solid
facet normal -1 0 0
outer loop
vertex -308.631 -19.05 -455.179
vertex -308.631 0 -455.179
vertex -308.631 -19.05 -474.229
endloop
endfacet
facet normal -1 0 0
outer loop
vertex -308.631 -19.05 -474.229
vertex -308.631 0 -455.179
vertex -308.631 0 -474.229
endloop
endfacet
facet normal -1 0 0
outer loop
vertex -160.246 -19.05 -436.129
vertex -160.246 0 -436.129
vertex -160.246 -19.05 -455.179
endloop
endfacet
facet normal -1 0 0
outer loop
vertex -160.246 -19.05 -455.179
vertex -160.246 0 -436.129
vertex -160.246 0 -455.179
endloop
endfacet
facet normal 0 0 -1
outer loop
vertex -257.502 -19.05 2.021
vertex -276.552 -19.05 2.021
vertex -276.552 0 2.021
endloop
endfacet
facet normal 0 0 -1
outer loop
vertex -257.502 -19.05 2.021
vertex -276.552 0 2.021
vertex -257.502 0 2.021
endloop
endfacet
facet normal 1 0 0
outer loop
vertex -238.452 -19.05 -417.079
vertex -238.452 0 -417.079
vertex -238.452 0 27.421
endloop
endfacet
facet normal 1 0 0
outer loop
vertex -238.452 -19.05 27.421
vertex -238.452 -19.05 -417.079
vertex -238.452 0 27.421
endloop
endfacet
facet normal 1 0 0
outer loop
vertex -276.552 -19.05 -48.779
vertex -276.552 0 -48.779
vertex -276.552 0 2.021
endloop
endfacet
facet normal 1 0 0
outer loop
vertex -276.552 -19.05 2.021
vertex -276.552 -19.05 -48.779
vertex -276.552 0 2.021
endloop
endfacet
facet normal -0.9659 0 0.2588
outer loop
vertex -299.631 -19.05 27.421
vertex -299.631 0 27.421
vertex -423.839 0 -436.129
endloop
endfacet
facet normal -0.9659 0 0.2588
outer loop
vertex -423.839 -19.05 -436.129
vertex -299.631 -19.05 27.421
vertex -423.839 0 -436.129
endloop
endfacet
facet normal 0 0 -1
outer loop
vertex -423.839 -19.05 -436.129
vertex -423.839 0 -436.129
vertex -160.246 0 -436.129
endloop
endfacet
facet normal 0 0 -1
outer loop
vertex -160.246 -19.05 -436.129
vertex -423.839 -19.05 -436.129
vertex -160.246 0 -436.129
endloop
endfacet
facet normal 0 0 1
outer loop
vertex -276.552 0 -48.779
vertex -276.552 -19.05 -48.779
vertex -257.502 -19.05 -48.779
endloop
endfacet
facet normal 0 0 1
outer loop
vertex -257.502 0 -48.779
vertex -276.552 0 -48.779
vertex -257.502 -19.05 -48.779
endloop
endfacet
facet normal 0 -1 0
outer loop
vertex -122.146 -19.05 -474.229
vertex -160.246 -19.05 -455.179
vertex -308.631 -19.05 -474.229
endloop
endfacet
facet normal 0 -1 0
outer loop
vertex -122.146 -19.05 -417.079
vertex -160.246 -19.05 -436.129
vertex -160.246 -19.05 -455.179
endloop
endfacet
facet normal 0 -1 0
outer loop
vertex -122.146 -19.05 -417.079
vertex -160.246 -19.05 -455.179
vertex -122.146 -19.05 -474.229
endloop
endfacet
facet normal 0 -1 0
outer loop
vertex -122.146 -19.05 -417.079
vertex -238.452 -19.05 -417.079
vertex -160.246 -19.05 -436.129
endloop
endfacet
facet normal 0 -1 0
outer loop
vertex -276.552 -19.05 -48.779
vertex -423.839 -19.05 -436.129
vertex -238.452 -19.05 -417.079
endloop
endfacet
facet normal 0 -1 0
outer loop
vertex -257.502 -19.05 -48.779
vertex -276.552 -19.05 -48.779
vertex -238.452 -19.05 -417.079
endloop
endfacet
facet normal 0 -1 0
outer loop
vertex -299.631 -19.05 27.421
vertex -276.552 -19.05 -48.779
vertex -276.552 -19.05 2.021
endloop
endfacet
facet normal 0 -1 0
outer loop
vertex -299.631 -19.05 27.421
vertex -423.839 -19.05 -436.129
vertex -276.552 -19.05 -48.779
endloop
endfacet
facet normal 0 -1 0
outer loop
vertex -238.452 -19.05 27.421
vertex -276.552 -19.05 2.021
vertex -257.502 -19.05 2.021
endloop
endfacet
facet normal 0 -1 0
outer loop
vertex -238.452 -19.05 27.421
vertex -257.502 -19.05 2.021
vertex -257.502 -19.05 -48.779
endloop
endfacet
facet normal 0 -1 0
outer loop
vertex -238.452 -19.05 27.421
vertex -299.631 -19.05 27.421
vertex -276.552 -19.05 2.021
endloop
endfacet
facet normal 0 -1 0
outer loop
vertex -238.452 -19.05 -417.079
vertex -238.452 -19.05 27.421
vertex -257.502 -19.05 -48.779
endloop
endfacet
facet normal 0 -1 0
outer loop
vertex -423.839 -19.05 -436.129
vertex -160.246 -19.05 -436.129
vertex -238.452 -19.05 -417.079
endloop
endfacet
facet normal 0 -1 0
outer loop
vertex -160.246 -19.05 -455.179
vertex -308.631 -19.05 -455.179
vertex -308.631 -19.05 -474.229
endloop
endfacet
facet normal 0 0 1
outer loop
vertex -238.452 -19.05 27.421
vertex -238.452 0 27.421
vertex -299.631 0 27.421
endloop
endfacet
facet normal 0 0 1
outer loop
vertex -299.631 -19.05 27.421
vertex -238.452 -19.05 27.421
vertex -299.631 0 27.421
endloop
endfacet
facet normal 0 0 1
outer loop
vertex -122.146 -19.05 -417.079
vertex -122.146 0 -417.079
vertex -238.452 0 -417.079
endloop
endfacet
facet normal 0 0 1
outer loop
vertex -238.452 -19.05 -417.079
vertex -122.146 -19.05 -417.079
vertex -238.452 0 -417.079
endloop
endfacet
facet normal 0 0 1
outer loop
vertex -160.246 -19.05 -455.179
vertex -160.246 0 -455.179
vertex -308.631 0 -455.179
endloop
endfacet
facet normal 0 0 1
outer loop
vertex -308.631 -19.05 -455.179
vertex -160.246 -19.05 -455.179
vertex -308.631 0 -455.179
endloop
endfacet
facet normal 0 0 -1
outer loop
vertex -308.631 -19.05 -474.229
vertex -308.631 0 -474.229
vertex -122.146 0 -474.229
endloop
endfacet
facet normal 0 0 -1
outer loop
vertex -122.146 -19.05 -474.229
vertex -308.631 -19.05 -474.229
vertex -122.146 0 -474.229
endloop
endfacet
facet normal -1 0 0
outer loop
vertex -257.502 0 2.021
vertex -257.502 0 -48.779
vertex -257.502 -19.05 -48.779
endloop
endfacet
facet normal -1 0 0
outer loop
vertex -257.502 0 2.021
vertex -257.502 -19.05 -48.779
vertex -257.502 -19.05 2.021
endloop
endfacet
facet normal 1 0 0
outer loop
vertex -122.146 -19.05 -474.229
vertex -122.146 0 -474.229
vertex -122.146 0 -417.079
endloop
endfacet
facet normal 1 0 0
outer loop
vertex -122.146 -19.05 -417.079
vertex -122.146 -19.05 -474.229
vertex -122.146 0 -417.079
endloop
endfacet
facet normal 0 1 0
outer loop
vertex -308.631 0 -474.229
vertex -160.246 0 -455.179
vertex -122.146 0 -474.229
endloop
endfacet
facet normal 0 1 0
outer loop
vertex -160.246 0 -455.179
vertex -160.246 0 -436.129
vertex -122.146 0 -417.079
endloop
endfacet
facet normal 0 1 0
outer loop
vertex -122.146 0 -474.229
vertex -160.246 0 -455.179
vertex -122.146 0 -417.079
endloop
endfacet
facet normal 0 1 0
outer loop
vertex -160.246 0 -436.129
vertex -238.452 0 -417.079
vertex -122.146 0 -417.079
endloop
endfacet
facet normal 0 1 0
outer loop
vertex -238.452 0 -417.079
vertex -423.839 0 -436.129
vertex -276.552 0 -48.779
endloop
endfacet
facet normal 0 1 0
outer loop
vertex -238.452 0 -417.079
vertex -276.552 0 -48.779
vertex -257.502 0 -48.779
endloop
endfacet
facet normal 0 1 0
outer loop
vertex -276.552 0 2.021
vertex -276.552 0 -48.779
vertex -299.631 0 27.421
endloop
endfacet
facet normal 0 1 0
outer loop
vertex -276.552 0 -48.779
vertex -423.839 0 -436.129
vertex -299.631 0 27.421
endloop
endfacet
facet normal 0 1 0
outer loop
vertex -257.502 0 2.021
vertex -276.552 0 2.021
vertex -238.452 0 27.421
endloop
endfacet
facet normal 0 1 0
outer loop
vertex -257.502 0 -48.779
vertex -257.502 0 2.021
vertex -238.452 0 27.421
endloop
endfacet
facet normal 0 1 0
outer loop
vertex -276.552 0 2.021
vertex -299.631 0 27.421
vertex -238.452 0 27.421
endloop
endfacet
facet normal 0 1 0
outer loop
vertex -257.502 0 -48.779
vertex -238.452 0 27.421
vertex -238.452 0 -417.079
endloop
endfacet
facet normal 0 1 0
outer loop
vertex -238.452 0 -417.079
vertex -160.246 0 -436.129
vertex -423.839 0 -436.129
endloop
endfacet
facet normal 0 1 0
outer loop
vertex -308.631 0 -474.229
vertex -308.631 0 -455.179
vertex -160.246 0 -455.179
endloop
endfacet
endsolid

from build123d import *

# Parameters (mm, degrees)
F0_W     = 19.05
F0_H     = 50.8
F1_DEPTH = 19.05


with BuildPart() as f1:
    # F0 (on Front) → F1 (new body)
    with BuildSketch(Plane.XZ):
        Polygon((-238.452145, -417.078608), (-238.452145, 27.421392), (-299.630938, 27.421392), (-423.838787, -436.128608), (-160.245545, -436.128608), (-160.245545, -455.178608), (-308.630615, -455.178608), (-308.630615, -474.228608), (-122.145545, -474.228608), (-122.145545, -417.078608), align=None)
        with Locations((-267.027145, -23.378608)):
            Rectangle(F0_W, F0_H, mode=Mode.SUBTRACT)
    extrude(amount=F1_DEPTH)


solid = f1.part
